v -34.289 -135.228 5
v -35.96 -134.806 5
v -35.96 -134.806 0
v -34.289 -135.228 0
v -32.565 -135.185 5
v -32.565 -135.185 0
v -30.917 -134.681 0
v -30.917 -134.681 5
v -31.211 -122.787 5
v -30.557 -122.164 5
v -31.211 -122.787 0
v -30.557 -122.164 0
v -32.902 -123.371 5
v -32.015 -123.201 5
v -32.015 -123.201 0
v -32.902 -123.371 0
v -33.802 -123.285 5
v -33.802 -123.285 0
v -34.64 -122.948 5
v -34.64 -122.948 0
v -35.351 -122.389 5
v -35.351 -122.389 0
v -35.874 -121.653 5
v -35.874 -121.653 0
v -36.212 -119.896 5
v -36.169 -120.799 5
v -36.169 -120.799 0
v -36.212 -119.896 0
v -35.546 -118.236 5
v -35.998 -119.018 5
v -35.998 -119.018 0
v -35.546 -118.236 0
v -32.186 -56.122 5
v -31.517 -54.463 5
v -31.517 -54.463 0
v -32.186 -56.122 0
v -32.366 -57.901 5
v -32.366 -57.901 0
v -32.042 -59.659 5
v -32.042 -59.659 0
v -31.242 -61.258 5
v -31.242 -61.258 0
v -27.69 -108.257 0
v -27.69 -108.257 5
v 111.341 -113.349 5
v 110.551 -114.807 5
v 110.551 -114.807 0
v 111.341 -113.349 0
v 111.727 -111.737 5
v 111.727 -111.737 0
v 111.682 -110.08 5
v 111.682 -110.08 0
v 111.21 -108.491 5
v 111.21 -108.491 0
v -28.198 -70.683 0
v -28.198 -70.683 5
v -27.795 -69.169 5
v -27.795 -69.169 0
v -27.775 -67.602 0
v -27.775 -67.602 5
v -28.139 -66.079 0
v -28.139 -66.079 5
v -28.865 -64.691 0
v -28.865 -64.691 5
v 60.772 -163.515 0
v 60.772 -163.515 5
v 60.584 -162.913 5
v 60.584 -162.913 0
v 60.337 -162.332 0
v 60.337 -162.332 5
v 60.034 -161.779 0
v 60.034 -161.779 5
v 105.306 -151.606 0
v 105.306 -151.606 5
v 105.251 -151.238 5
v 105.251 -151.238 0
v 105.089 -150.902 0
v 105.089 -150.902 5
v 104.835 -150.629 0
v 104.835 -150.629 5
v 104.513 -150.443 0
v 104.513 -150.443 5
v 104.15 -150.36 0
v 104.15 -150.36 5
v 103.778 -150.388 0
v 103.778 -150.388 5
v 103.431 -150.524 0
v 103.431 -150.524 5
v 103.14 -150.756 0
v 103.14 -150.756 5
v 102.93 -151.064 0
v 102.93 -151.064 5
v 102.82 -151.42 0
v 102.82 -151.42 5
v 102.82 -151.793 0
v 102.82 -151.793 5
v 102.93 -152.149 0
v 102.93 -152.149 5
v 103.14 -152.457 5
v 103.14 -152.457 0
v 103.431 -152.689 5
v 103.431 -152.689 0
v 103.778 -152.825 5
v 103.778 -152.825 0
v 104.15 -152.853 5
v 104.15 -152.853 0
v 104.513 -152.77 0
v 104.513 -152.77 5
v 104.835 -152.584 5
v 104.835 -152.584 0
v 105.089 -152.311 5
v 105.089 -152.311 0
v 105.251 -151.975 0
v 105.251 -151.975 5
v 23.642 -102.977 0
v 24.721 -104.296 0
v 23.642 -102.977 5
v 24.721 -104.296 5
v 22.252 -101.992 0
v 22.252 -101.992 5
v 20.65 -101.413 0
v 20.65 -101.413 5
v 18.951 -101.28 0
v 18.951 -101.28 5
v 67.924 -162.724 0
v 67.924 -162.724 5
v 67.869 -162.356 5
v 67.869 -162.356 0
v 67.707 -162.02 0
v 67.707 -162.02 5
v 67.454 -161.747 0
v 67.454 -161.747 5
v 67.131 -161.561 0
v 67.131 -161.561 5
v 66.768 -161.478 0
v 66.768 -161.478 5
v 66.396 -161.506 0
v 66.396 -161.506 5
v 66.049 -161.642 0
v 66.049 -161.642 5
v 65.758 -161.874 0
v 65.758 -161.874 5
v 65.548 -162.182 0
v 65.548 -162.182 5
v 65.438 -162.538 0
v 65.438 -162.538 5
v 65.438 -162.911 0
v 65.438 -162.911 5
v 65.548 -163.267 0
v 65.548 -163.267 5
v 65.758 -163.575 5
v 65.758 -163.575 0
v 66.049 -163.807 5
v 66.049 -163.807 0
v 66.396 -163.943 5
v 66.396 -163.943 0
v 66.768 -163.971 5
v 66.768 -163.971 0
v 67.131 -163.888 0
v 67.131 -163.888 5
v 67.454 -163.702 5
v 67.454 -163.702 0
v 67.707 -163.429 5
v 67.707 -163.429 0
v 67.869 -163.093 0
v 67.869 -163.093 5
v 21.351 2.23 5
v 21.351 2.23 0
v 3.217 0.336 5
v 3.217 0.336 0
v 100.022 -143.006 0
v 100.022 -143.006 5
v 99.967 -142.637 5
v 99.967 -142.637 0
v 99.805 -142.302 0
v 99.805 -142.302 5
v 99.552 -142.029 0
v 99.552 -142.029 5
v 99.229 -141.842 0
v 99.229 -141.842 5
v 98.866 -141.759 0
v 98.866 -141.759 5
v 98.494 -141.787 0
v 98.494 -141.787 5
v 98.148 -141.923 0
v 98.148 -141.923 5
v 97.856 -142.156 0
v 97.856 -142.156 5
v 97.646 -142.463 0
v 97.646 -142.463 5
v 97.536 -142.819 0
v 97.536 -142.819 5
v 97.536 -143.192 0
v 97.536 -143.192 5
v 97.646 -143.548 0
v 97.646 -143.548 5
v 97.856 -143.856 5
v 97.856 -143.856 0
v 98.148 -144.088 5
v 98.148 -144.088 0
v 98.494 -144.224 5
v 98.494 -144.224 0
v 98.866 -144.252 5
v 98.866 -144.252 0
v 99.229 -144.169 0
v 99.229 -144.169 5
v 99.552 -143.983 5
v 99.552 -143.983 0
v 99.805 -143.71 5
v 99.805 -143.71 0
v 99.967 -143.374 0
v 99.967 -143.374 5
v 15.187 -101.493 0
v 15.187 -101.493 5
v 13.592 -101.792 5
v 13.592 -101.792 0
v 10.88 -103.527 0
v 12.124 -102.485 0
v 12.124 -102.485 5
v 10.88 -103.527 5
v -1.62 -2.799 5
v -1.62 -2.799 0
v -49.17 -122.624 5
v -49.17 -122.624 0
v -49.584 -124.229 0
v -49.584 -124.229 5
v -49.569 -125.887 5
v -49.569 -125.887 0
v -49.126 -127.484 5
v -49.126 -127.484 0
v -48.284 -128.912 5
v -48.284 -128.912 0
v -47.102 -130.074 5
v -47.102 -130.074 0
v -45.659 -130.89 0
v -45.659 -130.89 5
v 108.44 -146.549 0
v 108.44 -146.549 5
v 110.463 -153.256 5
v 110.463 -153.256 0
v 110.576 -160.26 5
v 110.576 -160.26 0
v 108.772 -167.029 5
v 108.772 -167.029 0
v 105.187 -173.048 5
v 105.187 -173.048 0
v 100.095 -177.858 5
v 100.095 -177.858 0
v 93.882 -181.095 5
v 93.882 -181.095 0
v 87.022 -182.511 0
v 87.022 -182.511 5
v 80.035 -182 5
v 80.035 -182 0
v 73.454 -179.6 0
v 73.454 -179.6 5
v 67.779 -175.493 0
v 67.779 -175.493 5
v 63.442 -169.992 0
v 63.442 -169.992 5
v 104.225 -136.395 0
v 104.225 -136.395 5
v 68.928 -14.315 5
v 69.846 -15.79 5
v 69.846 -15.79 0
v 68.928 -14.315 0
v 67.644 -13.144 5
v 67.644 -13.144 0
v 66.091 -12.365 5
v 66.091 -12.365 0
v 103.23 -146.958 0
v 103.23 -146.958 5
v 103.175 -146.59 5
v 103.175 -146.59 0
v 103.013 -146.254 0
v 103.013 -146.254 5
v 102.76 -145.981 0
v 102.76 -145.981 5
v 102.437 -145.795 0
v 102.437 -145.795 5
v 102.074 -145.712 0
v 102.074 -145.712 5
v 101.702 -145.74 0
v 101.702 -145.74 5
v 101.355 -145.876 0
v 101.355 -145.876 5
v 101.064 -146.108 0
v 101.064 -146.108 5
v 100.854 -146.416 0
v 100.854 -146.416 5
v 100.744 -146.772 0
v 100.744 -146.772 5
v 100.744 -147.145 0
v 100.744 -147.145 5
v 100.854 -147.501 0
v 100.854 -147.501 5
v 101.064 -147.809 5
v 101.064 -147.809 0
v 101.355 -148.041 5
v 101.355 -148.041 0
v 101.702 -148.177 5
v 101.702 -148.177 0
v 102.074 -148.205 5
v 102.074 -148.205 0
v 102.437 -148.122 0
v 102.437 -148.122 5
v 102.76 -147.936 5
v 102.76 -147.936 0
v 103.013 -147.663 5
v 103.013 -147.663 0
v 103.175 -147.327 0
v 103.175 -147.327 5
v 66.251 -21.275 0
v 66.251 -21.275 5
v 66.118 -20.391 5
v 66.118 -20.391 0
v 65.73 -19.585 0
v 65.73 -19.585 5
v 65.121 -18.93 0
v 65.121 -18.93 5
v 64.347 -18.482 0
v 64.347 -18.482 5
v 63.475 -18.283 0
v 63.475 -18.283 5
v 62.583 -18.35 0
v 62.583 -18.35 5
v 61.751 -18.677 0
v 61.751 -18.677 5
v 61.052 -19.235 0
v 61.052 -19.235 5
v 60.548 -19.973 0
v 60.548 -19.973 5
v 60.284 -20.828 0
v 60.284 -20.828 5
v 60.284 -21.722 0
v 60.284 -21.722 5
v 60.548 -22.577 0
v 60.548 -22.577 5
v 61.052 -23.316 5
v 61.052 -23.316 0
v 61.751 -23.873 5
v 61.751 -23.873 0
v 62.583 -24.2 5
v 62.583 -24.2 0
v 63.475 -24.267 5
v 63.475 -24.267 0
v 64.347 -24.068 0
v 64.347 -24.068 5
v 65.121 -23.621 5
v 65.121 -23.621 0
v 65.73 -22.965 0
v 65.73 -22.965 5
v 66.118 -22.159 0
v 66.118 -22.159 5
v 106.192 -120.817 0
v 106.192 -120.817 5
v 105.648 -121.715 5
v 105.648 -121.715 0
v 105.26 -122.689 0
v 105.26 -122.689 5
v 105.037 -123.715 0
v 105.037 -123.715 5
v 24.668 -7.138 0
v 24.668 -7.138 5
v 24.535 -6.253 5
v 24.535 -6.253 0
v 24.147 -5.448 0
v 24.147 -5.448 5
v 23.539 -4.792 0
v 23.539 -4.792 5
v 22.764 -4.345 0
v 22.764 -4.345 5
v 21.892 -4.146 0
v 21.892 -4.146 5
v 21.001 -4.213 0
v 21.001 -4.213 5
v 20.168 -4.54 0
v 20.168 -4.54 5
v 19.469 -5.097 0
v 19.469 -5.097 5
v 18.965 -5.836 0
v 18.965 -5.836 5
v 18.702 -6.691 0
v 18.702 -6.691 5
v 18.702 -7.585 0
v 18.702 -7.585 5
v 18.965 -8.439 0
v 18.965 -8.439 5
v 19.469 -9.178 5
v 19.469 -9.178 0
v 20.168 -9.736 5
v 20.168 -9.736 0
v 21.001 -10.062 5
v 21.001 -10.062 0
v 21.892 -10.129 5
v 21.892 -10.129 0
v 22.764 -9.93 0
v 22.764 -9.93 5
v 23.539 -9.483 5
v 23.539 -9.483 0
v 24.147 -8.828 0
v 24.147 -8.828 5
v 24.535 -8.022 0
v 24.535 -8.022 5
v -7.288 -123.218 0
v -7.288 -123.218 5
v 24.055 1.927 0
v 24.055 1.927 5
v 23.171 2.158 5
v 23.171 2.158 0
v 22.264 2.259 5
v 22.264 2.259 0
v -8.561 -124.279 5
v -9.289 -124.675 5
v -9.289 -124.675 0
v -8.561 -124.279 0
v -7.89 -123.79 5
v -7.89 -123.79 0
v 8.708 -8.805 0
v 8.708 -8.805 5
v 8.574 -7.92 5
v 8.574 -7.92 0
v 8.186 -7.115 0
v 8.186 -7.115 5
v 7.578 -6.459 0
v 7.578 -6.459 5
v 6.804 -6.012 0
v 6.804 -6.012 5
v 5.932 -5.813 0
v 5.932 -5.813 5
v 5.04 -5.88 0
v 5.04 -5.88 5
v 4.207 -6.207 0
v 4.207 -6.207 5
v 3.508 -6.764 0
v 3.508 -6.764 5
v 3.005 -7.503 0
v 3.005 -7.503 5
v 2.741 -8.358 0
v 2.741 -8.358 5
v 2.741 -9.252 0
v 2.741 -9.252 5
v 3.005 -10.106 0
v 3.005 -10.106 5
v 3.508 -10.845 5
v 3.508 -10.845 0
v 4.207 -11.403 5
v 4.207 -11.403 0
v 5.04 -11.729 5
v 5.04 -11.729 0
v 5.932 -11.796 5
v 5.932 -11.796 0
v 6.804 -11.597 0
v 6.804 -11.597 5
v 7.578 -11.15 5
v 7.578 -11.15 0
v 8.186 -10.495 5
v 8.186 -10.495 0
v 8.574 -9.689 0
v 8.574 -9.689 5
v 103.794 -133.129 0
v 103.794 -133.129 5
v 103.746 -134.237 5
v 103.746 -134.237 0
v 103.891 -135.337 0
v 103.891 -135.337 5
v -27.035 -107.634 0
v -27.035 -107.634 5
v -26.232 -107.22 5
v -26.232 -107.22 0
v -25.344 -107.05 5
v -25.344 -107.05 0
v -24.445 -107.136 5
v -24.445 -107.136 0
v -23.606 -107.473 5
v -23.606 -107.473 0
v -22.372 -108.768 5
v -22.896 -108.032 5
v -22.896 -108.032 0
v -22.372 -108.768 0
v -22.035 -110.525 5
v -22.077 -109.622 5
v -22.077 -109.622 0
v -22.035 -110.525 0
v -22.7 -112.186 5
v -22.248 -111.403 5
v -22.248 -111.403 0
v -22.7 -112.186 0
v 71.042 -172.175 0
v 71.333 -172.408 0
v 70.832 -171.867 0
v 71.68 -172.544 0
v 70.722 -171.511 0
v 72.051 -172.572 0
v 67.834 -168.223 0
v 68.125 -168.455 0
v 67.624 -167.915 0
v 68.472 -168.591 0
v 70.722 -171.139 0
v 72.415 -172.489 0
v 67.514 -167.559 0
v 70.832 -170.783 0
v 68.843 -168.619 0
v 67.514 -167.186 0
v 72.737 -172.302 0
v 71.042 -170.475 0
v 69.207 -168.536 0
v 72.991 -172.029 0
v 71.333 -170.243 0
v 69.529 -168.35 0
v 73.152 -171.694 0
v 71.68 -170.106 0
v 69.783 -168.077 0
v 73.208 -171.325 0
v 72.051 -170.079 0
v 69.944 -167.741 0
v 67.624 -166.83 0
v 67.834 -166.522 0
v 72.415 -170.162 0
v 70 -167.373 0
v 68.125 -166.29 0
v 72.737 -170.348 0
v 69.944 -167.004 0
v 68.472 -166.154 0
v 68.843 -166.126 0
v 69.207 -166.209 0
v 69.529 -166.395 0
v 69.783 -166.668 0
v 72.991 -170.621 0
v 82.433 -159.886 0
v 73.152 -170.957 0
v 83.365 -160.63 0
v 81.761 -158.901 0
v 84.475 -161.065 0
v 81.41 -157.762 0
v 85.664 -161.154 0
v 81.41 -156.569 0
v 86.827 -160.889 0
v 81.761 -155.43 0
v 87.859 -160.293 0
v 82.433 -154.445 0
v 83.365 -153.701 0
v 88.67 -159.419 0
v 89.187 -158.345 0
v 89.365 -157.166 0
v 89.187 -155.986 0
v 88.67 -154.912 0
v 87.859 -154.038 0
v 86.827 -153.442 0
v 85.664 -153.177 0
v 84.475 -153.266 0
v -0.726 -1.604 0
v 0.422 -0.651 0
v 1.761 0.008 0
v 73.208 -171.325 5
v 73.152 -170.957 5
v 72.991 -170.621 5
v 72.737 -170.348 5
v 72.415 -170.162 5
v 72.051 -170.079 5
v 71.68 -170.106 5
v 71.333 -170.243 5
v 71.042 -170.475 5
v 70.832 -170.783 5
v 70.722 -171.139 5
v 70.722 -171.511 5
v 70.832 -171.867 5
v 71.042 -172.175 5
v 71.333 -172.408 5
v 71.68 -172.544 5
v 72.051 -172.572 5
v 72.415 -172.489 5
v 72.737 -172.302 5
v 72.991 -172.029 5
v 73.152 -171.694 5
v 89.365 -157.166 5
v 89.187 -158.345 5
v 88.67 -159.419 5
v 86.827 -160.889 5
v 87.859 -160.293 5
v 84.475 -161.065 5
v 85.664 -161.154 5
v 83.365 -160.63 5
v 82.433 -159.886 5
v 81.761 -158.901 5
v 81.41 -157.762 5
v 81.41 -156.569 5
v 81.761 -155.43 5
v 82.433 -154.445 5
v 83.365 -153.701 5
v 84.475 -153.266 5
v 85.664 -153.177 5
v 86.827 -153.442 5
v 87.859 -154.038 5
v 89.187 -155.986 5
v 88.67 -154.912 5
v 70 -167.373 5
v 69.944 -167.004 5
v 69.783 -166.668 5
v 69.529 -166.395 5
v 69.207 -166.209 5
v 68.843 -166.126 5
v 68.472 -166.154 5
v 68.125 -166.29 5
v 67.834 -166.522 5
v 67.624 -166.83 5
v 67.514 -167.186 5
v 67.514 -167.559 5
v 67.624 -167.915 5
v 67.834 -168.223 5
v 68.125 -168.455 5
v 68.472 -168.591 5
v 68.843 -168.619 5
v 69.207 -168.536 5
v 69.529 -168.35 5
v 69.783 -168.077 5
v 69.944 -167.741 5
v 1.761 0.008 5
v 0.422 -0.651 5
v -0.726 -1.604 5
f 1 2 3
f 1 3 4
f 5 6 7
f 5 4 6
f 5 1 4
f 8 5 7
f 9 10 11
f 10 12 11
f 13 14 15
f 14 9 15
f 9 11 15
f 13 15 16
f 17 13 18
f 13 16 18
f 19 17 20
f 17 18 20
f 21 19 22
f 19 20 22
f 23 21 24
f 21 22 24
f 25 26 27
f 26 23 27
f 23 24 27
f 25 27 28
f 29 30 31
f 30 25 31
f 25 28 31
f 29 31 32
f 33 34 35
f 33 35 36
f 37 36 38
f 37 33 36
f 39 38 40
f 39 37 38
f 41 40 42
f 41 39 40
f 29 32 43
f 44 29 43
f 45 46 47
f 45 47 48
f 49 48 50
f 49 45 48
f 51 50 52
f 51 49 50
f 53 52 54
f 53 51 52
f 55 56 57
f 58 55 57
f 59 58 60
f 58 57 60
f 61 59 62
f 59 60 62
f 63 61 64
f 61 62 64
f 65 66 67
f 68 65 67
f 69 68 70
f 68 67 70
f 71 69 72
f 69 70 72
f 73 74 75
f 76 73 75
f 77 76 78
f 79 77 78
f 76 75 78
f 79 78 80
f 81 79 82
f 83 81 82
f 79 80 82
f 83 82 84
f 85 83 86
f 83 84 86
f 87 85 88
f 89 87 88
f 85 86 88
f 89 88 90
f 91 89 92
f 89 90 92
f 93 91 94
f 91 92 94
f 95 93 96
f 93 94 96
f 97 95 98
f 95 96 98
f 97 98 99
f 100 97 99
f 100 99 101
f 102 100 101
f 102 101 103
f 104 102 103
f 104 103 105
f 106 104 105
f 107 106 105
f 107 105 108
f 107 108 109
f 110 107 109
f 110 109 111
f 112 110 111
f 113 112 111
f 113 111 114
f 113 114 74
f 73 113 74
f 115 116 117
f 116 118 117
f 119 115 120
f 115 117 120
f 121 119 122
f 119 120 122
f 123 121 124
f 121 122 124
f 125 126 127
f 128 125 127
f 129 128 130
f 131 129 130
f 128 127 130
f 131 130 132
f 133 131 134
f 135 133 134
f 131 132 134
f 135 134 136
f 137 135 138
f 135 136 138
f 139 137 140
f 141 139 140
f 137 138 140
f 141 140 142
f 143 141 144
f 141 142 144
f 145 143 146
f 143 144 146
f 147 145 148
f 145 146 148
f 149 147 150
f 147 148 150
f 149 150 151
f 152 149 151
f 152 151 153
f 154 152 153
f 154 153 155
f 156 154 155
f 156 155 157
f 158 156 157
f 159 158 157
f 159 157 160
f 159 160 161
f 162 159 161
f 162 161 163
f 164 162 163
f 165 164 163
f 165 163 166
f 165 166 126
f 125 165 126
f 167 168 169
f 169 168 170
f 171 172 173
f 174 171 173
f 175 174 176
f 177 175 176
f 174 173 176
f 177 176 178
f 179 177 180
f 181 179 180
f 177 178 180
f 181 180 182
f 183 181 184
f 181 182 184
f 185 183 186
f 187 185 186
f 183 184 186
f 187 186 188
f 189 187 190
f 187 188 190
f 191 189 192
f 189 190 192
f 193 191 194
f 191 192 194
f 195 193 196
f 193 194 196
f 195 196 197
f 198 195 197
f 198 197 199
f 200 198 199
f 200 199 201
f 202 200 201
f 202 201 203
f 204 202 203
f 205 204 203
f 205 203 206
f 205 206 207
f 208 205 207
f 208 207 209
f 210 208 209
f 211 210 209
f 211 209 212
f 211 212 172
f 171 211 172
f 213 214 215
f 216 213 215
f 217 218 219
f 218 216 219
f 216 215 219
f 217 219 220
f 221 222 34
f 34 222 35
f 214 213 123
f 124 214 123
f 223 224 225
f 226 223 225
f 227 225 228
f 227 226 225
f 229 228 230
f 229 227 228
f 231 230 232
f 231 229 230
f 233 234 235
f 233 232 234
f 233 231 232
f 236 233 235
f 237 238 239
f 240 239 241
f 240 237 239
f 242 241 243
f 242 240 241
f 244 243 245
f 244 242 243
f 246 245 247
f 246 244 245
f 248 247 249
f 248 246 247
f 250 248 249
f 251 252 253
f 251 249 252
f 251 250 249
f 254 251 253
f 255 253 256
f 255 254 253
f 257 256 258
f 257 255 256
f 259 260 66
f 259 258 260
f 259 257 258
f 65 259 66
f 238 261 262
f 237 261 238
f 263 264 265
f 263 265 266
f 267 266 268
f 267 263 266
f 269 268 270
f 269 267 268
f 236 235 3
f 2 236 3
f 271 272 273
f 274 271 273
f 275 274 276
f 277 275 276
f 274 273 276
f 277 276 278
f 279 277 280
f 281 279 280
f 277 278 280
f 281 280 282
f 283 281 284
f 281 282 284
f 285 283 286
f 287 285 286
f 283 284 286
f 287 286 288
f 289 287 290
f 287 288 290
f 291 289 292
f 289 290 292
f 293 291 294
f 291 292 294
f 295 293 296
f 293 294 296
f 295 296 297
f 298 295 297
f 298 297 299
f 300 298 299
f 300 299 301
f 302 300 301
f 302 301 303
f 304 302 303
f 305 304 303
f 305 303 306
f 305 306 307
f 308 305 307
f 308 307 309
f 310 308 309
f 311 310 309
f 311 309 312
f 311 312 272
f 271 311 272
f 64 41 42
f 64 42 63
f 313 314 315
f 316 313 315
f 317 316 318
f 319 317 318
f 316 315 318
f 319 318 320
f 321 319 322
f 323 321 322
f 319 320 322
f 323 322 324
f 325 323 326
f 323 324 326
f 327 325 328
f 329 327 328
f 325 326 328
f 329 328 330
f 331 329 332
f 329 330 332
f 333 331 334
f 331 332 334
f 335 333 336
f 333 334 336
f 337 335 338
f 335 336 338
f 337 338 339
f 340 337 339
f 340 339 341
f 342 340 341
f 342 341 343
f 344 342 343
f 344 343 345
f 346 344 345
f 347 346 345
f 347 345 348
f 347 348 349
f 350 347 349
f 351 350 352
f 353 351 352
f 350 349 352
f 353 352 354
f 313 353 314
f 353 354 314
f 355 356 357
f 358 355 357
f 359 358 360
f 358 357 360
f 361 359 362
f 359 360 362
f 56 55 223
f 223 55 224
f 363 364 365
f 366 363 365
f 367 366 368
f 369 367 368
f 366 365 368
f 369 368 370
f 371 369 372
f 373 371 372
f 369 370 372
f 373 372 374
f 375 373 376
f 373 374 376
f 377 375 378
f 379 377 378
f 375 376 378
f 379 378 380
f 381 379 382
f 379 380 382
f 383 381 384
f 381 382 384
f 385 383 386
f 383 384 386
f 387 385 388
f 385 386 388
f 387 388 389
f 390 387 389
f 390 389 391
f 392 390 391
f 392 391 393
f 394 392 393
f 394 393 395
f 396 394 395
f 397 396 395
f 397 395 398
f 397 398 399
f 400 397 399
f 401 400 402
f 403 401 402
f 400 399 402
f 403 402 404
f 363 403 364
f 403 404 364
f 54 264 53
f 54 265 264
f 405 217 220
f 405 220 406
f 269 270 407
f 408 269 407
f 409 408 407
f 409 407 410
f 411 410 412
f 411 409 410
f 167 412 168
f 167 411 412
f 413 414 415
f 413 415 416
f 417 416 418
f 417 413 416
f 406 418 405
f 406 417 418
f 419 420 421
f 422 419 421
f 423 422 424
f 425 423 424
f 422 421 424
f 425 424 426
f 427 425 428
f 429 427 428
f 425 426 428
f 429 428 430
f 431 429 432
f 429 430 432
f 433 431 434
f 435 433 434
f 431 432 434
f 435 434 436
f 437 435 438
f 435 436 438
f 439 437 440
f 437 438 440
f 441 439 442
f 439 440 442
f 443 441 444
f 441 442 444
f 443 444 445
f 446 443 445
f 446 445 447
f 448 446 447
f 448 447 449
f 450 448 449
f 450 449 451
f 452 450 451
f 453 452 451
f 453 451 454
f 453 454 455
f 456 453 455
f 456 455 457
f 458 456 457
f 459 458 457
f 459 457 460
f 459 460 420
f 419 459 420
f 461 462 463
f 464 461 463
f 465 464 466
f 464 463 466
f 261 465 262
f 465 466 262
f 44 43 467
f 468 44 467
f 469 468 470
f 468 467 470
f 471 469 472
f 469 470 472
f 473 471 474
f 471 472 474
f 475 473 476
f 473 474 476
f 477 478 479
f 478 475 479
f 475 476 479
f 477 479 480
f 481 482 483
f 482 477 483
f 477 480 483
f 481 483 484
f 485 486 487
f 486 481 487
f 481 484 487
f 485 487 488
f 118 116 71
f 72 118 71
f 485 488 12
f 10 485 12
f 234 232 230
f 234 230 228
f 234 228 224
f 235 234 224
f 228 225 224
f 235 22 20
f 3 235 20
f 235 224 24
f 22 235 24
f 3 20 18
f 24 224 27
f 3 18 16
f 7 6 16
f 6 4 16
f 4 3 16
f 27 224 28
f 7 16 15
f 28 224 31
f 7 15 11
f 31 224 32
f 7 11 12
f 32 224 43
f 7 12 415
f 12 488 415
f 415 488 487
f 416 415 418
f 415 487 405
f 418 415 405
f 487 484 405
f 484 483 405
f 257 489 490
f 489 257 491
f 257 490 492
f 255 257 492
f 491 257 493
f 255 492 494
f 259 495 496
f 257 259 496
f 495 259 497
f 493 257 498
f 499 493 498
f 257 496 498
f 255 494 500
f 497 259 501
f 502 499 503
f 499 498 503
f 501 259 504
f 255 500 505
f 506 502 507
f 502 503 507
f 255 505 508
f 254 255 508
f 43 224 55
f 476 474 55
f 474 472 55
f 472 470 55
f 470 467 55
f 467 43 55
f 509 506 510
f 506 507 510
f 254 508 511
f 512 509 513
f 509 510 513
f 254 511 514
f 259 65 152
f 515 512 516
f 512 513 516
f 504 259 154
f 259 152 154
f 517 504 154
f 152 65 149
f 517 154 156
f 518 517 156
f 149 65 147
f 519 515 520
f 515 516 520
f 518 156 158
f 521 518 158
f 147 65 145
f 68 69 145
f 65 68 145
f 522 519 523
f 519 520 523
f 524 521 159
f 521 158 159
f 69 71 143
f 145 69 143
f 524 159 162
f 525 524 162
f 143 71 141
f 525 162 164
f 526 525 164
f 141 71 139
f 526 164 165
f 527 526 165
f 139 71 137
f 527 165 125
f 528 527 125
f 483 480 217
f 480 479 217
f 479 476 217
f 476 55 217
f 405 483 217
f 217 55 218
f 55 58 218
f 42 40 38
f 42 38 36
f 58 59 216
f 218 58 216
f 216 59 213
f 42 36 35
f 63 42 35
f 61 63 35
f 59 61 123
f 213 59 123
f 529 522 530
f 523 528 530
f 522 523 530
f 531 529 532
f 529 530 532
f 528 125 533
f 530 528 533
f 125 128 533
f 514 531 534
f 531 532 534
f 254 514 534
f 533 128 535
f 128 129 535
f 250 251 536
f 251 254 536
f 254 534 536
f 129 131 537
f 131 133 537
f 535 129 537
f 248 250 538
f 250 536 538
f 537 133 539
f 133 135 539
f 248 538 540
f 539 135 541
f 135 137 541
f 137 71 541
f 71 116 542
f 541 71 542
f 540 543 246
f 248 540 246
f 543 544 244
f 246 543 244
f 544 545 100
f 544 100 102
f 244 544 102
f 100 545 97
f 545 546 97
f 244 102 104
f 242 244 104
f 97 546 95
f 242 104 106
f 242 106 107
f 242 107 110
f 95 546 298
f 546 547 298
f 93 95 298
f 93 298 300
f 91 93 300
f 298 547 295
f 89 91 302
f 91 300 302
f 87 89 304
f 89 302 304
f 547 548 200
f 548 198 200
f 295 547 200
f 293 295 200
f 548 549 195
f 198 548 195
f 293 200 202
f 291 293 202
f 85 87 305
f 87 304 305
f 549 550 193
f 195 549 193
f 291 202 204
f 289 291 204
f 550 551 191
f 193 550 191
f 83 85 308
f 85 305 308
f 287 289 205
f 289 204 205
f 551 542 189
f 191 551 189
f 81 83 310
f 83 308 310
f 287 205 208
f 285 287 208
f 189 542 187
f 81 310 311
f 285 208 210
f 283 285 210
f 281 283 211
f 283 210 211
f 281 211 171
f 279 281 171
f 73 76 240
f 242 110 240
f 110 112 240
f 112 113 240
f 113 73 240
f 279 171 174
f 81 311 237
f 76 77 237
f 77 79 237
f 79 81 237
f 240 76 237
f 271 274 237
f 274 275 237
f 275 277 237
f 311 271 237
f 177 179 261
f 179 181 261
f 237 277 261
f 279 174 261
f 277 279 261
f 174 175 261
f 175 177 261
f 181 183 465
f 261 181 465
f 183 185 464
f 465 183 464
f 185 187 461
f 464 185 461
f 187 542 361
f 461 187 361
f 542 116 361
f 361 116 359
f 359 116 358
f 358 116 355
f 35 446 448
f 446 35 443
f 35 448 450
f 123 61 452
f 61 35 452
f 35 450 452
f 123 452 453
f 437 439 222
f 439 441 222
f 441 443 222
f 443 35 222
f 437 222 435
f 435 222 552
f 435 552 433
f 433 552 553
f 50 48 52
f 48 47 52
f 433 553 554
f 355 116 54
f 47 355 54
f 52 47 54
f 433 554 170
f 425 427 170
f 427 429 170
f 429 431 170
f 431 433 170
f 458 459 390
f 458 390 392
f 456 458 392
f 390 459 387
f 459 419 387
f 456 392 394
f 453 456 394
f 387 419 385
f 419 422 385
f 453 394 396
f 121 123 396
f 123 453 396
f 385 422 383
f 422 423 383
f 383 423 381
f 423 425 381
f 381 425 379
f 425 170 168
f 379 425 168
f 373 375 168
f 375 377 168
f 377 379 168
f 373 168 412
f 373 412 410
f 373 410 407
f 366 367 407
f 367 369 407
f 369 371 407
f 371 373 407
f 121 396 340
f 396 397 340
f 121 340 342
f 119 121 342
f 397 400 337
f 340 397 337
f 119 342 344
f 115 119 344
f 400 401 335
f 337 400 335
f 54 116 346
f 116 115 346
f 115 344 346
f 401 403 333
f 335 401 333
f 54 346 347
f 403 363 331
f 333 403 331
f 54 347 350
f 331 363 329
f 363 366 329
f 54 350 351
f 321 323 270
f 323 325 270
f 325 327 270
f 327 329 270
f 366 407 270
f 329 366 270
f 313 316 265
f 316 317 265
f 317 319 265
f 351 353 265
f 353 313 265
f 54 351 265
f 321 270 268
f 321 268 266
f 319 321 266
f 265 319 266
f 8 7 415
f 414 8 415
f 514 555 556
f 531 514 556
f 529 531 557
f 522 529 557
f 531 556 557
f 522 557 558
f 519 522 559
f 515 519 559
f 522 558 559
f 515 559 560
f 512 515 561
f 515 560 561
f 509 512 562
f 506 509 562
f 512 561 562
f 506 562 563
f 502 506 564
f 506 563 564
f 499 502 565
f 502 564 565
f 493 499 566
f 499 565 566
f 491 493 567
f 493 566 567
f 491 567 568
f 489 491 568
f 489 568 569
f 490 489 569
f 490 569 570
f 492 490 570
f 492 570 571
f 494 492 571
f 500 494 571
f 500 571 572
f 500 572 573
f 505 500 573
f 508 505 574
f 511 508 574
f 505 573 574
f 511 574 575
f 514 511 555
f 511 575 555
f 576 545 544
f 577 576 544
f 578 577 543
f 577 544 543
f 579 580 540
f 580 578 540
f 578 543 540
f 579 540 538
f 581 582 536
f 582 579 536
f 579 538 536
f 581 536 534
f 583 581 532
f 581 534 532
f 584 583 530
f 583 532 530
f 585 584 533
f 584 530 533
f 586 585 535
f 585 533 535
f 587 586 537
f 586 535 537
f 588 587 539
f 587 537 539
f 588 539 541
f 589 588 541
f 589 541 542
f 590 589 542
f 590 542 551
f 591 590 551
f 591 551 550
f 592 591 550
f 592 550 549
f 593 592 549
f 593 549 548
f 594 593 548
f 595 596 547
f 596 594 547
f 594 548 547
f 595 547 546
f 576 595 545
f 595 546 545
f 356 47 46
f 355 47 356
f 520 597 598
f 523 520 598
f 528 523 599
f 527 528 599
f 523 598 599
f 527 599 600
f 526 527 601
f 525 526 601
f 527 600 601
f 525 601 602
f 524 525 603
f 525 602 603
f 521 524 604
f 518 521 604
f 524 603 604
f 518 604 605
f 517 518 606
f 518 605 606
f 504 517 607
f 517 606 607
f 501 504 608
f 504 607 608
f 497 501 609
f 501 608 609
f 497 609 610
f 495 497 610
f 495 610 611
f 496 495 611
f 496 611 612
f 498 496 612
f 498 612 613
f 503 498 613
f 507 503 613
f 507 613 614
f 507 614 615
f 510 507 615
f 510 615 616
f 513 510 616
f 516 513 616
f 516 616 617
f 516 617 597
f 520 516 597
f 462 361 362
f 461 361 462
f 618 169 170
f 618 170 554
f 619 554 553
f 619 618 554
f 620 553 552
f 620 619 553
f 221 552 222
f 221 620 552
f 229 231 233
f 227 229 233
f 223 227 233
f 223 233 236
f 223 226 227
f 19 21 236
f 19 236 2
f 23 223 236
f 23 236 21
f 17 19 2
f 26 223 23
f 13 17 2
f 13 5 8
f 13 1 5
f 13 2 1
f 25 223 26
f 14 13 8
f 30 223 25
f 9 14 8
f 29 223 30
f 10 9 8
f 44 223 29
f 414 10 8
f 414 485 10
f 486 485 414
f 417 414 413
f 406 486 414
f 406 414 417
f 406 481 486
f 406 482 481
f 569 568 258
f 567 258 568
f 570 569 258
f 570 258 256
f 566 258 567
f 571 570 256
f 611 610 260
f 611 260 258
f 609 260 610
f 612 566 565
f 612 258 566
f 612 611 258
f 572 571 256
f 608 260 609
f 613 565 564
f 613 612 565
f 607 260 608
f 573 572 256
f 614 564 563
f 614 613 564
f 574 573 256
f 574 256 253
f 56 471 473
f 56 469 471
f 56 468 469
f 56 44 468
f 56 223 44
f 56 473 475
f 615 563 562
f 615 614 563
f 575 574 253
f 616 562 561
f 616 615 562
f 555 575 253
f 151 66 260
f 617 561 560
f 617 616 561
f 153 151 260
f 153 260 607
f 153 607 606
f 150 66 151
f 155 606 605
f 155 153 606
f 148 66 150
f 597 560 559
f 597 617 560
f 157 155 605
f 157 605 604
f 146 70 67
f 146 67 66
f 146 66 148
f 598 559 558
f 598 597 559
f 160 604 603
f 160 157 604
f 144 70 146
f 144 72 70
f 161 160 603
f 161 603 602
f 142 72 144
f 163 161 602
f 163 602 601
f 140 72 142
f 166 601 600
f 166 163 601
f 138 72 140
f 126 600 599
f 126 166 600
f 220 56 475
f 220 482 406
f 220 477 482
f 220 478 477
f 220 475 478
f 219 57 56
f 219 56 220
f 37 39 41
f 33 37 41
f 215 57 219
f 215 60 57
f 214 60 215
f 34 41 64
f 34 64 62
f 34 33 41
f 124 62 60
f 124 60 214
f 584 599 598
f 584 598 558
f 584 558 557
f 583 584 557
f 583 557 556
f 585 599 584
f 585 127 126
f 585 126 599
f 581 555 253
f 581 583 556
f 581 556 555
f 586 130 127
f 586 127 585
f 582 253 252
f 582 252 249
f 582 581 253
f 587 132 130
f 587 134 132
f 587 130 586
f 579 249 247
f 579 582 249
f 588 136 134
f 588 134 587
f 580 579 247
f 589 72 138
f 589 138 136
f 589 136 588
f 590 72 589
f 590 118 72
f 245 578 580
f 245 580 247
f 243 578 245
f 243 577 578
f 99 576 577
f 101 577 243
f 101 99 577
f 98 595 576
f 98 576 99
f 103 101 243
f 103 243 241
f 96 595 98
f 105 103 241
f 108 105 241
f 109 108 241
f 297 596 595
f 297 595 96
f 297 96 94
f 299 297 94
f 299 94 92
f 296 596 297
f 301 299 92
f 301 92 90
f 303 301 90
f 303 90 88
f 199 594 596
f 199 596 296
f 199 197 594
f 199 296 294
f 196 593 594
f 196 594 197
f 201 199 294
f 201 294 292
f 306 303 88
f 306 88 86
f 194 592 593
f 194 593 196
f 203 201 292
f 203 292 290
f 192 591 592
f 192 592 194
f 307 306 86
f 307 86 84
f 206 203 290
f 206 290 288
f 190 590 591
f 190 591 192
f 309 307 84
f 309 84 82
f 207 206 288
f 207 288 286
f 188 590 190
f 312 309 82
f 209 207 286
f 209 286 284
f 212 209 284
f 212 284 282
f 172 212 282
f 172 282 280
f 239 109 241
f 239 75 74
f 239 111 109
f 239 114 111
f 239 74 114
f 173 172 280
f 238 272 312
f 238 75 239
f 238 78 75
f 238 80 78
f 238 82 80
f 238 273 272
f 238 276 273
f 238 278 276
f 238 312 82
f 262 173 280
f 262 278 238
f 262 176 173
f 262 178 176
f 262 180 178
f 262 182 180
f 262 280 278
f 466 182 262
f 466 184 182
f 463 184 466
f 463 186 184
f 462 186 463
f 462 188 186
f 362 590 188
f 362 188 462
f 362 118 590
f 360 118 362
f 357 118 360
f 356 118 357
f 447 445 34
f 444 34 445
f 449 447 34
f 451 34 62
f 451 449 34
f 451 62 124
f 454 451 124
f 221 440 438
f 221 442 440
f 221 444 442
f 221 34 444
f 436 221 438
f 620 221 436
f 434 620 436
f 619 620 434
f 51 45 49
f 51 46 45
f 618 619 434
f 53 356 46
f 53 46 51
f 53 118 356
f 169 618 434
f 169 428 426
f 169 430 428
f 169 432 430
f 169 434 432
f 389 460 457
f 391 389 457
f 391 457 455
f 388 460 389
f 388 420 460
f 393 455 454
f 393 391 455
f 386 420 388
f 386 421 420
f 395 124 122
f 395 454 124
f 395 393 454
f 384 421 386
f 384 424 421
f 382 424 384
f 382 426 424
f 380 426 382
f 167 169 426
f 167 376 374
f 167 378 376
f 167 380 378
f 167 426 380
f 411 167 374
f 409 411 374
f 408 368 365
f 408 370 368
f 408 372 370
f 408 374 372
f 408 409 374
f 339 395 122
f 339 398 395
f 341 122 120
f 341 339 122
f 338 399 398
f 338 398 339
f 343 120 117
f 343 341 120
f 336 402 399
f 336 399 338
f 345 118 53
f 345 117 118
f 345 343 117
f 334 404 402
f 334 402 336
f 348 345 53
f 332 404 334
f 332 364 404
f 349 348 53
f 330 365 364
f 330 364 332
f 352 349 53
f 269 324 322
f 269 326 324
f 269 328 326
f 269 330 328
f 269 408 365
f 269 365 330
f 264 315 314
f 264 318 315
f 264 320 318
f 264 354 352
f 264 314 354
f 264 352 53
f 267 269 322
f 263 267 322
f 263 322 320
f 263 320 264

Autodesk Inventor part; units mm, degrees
ref_plane "YZ Plane" through (0, 0, 0) normal (1, 0, 0) x (0, 1, 0)
ref_plane "XZ Plane" through (0, 0, 0) normal (0, 1, 0) x (-1, 0, 0)
ref_plane "XY Plane" through (0, 0, 0) normal (0, 0, 1) x (1, 0, 0)
sketch "Base" plane through (0, 0, 0) normal (0, 0, 1) x (1, 0, 0)
  line L0 (0, 0) -> (-33.5334, -57.9479)
  line L1 (22.7363, 2.3748) -> (0, 0)
  line L2 (68.7163, -13.2577) -> (22.7363, 2.3748)
  line L3 (-33.5334, -57.9479) -> (-26.9158, -67.5067)
  line L4 (-26.9158, -67.5067) -> (-51.547, -128.5125)
  line L5 (-51.547, -128.5125) -> (-33.4114, -135.8348)
  line L6 (-26.9158, -67.5067) -> (12.6221, -101.6388) construction
  line L7 (12.6221, -101.6388) -> (22.7363, -101.0656)
  line L8 (12.6221, -101.6388) -> (-8.1441, -124.1457)
  line L9 (-33.4114, -135.8348) -> (-8.1441, -124.1457)
  line L10 (22.7363, 2.3748) -> (68.7163, -13.2577)
  line L11 (68.7163, -13.2577) -> (112.7039, -111.8391)
  line L12 (22.7363, 2.3748) -> (22.7363, -101.0656) construction
  line L13 (22.7363, -101.0656) -> (65.9464, -171.4033)
  line L14 (112.7039, -111.8391) -> (105.2475, -122.1197)
  line L15 (22.7363, -101.0656) -> (112.7039, -111.8391) construction
  line L16 (105.2475, -122.1197) -> (103.571, -134.8197)
  line L17 (103.571, -134.8197) -> (108.4402, -146.5492)
  line L18 (65.9464, -171.4033) -> (74.9694, -180.3406)
  line L19 (108.4402, -146.5492) -> (74.9694, -180.3406)
  circle A0 centre (85.3652, -157.1655) radius 25.4
  line L20 (-42.4792, -132.1736) -> (22.7363, -49.3454) construction
  line L21 (-33.0514, -120.1997) -> (-25.1949, -110.2215) construction
  line L22 (-35.546, -118.2356) -> (-27.6895, -108.2573)
  line L23 (-22.7004, -112.1856) -> (-30.5568, -122.1638)
  arc A1 (-35.546, -118.2356) -> (-30.5568, -122.1638) centre (-33.0514, -120.1997) ccw
  arc A2 (-22.7004, -112.1856) -> (-27.6895, -108.2573) centre (-25.1949, -110.2215) ccw
  circle A3 centre (85.3652, -157.1655) radius 4
  line L24 (0, -219.5535) -> (0, 39.3628)
  point P0 (-29.1232, -115.2106)
  point P1 (60.5618, -162.6381)
  dimension "d4" = 50.8
  dimension "d5" = 22.86
  dimension "d6" = 155.26
  dimension "d7" = 126.02
  dimension "d8" = 48.5647
  dimension "d9" = 66.9511
  dimension "d10" = 132.824
  dimension "d11" = 107.95
  dimension "d12" = 115.248
  dimension "d13" = 11.6259
  dimension "d14" = 65.7906
  dimension "d15" = 19.558
  dimension "d16" = 120
  dimension "d17" = 12.7
  dimension "d18" = 12.7
  dimension "d19" = 12.7
  dimension "d20" = 82.55
  dimension "d21" = 12.7
  dimension "d24" = 15.24
  dimension "d25" = 3.175
  dimension "d26" = 12.7
  dimension "d31" = 8
  dimension "d32" = 95.963
  dimension "d33" = 38.215
  dimension "d34" = 22.545
  dimension "d35" = 7.52
  dimension "d36" = 44.727
  dimension "d37" = 31.563
  dimension "d38" = 86.757
  dimension "d39" = 42.697
  dimension "d40" = 49.197
  dimension "d41" = 114.826
  dimension "d47" = 105.4209
  dimension "d48" = 62.051
extrude "Plate1" add sketch "Base" along normal blind 5
fillet "OutsideFilletsFeature" radius 6.35 14 edges at (68.7163, -13.2577, 2.5) (22.7363, 2.3748, 2.5) (0, 0, 2.5) (-33.5334, -57.9479, 2.5) (-26.9158, -67.5067, 2.5) (-51.547, -128.5125, 2.5) (-33.4114, -135.8348, 2.5) (-8.1441, -124.1457, 2.5) (12.6221, -101.6388, 2.5) (22.7363, -101.0656, 2.5) (60.5618, -162.6381, 2.5) (103.571, -134.8197, 2.5) (105.2475, -122.1197, 2.5) (112.7039, -111.8391, 2.5)
sketch "MountHoles" plane through (0, 0, 5) normal (0, 0, 1) x (1, 0, 0)
  line L0 (-1.6199, -2.7989) -> (-30.9807, -53.5288) construction
  arc A0 (3.2163, 0.3359) -> (-1.6199, -2.7989) centre (3.876, -5.9797) ccw construction
  line L1 (21.3511, 2.2301) -> (3.2163, 0.3359) construction
  arc A1 (24.0549, 1.9264) -> (21.3511, 2.2301) centre (22.0108, -4.0856) ccw construction
  arc A2 (69.8461, -15.7897) -> (66.0912, -12.3652) centre (64.0472, -18.3772) ccw construction
  line L2 (24.0548, 1.9265) -> (66.0912, -12.3652) construction
  line L3 (66.0912, -12.3652) -> (24.0548, 1.9265) construction
  line L4 (-20.7142, -54.4632) -> (5.7075, -8.8047) construction
  line L5 (5.7075, -8.8047) -> (21.6681, -7.1377) construction
  line L6 (21.6681, -7.1377) -> (66.0912, -22.2408) construction
  line L7 (-31.5169, -54.4632) -> (-1.6198, -2.7992) construction
  line L8 (3.2166, 0.336) -> (21.3512, 2.2301) construction
  line L9 (24.0548, 1.9265) -> (66.0912, -12.3652) construction
  line L10 (-31.5169, -54.4632) -> (-20.7142, -54.4632) construction
  line L11 (66.0912, -22.2408) -> (66.0912, -12.3652) construction
  circle A3 centre (5.7075, -8.8047) radius 3
  circle A4 centre (21.6681, -7.1377) radius 3
  circle A5 centre (63.2509, -21.2751) radius 3
  point P0 (0, 0)
  dimension "d49" = 9.35
  dimension "d50" = 9.35
  dimension "d51" = 9.35
  dimension "d52" = 6
  dimension "d53" = 6
  dimension "d54" = 6
  dimension "d55" = 3
extrude "MountHolesFeature" cut sketch "MountHoles" against normal blind 5
sketch "Sketch5" plane through (0, 0, 5) normal (0, 0, 1) x (1, 0, 0)
  circle A0 centre (85.3652, -157.1655) radius 4 construction
  circle A1 centre (85.3652, -157.1655) radius 4 projected
  circle A2 centre (85.3652, -157.1655) radius 19.5 construction
  line L0 (85.3652, -157.1655) -> (95.5724, -173.7807) construction
  line L1 (60.034, -161.7789) -> (24.7209, -104.2961) construction
  line L2 (85.3652, -157.1655) -> (101.9804, -146.9584) construction
  circle A3 centre (101.9804, -146.9584) radius 1.25
  circle A4 centre (98.7725, -143.0058) radius 1.25
  circle A5 centre (104.0561, -151.6065) radius 1.25
  circle A6 centre (68.75, -167.3726) radius 1.25
  circle A7 centre (66.6744, -162.7245) radius 1.25
  circle A8 centre (71.958, -171.3251) radius 1.25
  point P0 (0, 0)
  dimension "d67" = 39
  dimension "d68" = 2.5
  dimension "d71" = 30
extrude "Cut5" cut sketch "Sketch5" against normal blind 5 contours A3 | A4 | A5 | A6 | A7 | A8
equation "\"d50\" = d49"
equation "\"d51\" = d49"
equation "\"d56\" = Thickness"
equation "\"d42\" = Thickness"
equation "\"BendRadius\" = Thickness"
equation "\"BendReliefWidth\" = Thickness"
equation "\"BendReliefDepth\" = 0.5 * Thickness"
equation "\"TransitionRadius\" = BendRadius"
equation "\"JacobiRadiusSize\" = BendRadius"
equation "\"GapSize\" = Thickness"
equation "\"Thickness\" = 5"
properties part number "Knee"
